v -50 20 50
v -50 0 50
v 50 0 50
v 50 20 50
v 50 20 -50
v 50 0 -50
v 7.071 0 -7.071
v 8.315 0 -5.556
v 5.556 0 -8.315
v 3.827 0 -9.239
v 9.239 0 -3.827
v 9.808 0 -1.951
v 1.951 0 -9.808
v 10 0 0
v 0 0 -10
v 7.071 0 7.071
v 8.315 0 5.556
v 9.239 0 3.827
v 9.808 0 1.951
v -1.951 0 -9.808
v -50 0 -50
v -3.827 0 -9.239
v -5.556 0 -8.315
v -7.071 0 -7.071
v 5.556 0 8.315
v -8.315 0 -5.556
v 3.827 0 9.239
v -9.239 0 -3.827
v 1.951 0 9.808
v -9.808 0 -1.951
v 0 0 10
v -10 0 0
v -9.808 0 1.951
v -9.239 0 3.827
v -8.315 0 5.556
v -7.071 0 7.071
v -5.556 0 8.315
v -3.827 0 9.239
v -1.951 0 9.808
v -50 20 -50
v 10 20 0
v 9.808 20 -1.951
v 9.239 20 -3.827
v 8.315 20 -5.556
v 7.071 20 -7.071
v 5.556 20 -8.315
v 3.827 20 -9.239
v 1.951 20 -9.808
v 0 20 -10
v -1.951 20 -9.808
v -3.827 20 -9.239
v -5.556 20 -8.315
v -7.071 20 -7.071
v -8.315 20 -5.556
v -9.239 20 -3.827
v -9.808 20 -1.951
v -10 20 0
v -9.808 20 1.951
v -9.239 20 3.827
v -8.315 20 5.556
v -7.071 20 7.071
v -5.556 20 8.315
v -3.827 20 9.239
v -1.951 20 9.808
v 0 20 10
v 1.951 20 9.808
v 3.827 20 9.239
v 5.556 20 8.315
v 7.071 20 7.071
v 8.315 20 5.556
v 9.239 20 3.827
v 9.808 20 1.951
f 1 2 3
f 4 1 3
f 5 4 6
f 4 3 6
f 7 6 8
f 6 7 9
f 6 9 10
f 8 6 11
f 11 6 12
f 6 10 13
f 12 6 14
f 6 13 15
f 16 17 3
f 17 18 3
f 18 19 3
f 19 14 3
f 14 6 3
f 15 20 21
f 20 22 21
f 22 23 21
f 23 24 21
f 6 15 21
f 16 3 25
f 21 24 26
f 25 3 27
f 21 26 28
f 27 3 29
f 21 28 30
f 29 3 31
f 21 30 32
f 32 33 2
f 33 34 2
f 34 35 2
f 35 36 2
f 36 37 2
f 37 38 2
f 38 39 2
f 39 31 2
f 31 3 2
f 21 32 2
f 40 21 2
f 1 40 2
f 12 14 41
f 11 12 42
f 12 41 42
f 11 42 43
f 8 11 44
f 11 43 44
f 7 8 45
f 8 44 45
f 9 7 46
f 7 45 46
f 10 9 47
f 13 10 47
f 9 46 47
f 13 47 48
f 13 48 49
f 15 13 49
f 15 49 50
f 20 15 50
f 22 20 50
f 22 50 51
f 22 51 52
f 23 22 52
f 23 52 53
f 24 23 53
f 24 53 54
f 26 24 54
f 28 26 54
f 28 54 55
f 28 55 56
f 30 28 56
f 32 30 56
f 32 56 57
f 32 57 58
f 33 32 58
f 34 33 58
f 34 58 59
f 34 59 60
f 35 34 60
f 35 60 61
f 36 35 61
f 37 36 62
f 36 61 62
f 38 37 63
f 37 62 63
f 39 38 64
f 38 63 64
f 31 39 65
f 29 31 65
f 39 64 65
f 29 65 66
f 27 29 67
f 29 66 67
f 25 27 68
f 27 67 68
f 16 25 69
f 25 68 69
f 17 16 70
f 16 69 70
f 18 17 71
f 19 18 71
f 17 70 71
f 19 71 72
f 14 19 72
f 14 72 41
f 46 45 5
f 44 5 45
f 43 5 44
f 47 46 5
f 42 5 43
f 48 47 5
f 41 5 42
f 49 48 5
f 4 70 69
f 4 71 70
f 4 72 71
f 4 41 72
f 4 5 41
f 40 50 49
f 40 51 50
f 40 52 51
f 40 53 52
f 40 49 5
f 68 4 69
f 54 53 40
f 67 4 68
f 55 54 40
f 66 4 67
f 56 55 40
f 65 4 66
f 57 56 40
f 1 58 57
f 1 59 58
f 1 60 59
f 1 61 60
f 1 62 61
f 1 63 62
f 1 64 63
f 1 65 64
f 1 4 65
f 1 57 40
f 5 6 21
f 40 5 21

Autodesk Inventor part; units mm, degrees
ref_plane "YZ Plane" through (0, 0, 0) normal (1, 0, 0) x (0, 1, 0)
ref_plane "XZ Plane" through (0, 0, 0) normal (0, 1, 0) x (-1, 0, 0)
ref_plane "XY Plane" through (0, 0, 0) normal (0, 0, 1) x (1, 0, 0)
sketch "Sketch1" plane through (0, 0, 0) normal (0, 1, 0) x (-1, 0, 0)
  line L0 (50, 50) -> (-50, 50)
  line L1 (-50, 50) -> (-50, -50)
  line L2 (-50, -50) -> (50, -50)
  line L3 (50, -50) -> (50, 50)
  line L4 (50, 50) -> (-50, -50) construction
  line L5 (-50, 50) -> (50, -50) construction
  point P0 (0, 0)
  dimension "d0" = 100
  dimension "d1" = 100
extrude "Extrusion1" add sketch "Sketch1" along normal blind 20
sketch "Sketch2" plane through (0, 20, 0) normal (0, 1, 0) x (1, 0, 0)
  circle A0 centre (0, 0) radius 10
  dimension "d4" = 20
extrude "Extrusion2" cut sketch "Sketch2" against normal blind 20
properties part number "End"
